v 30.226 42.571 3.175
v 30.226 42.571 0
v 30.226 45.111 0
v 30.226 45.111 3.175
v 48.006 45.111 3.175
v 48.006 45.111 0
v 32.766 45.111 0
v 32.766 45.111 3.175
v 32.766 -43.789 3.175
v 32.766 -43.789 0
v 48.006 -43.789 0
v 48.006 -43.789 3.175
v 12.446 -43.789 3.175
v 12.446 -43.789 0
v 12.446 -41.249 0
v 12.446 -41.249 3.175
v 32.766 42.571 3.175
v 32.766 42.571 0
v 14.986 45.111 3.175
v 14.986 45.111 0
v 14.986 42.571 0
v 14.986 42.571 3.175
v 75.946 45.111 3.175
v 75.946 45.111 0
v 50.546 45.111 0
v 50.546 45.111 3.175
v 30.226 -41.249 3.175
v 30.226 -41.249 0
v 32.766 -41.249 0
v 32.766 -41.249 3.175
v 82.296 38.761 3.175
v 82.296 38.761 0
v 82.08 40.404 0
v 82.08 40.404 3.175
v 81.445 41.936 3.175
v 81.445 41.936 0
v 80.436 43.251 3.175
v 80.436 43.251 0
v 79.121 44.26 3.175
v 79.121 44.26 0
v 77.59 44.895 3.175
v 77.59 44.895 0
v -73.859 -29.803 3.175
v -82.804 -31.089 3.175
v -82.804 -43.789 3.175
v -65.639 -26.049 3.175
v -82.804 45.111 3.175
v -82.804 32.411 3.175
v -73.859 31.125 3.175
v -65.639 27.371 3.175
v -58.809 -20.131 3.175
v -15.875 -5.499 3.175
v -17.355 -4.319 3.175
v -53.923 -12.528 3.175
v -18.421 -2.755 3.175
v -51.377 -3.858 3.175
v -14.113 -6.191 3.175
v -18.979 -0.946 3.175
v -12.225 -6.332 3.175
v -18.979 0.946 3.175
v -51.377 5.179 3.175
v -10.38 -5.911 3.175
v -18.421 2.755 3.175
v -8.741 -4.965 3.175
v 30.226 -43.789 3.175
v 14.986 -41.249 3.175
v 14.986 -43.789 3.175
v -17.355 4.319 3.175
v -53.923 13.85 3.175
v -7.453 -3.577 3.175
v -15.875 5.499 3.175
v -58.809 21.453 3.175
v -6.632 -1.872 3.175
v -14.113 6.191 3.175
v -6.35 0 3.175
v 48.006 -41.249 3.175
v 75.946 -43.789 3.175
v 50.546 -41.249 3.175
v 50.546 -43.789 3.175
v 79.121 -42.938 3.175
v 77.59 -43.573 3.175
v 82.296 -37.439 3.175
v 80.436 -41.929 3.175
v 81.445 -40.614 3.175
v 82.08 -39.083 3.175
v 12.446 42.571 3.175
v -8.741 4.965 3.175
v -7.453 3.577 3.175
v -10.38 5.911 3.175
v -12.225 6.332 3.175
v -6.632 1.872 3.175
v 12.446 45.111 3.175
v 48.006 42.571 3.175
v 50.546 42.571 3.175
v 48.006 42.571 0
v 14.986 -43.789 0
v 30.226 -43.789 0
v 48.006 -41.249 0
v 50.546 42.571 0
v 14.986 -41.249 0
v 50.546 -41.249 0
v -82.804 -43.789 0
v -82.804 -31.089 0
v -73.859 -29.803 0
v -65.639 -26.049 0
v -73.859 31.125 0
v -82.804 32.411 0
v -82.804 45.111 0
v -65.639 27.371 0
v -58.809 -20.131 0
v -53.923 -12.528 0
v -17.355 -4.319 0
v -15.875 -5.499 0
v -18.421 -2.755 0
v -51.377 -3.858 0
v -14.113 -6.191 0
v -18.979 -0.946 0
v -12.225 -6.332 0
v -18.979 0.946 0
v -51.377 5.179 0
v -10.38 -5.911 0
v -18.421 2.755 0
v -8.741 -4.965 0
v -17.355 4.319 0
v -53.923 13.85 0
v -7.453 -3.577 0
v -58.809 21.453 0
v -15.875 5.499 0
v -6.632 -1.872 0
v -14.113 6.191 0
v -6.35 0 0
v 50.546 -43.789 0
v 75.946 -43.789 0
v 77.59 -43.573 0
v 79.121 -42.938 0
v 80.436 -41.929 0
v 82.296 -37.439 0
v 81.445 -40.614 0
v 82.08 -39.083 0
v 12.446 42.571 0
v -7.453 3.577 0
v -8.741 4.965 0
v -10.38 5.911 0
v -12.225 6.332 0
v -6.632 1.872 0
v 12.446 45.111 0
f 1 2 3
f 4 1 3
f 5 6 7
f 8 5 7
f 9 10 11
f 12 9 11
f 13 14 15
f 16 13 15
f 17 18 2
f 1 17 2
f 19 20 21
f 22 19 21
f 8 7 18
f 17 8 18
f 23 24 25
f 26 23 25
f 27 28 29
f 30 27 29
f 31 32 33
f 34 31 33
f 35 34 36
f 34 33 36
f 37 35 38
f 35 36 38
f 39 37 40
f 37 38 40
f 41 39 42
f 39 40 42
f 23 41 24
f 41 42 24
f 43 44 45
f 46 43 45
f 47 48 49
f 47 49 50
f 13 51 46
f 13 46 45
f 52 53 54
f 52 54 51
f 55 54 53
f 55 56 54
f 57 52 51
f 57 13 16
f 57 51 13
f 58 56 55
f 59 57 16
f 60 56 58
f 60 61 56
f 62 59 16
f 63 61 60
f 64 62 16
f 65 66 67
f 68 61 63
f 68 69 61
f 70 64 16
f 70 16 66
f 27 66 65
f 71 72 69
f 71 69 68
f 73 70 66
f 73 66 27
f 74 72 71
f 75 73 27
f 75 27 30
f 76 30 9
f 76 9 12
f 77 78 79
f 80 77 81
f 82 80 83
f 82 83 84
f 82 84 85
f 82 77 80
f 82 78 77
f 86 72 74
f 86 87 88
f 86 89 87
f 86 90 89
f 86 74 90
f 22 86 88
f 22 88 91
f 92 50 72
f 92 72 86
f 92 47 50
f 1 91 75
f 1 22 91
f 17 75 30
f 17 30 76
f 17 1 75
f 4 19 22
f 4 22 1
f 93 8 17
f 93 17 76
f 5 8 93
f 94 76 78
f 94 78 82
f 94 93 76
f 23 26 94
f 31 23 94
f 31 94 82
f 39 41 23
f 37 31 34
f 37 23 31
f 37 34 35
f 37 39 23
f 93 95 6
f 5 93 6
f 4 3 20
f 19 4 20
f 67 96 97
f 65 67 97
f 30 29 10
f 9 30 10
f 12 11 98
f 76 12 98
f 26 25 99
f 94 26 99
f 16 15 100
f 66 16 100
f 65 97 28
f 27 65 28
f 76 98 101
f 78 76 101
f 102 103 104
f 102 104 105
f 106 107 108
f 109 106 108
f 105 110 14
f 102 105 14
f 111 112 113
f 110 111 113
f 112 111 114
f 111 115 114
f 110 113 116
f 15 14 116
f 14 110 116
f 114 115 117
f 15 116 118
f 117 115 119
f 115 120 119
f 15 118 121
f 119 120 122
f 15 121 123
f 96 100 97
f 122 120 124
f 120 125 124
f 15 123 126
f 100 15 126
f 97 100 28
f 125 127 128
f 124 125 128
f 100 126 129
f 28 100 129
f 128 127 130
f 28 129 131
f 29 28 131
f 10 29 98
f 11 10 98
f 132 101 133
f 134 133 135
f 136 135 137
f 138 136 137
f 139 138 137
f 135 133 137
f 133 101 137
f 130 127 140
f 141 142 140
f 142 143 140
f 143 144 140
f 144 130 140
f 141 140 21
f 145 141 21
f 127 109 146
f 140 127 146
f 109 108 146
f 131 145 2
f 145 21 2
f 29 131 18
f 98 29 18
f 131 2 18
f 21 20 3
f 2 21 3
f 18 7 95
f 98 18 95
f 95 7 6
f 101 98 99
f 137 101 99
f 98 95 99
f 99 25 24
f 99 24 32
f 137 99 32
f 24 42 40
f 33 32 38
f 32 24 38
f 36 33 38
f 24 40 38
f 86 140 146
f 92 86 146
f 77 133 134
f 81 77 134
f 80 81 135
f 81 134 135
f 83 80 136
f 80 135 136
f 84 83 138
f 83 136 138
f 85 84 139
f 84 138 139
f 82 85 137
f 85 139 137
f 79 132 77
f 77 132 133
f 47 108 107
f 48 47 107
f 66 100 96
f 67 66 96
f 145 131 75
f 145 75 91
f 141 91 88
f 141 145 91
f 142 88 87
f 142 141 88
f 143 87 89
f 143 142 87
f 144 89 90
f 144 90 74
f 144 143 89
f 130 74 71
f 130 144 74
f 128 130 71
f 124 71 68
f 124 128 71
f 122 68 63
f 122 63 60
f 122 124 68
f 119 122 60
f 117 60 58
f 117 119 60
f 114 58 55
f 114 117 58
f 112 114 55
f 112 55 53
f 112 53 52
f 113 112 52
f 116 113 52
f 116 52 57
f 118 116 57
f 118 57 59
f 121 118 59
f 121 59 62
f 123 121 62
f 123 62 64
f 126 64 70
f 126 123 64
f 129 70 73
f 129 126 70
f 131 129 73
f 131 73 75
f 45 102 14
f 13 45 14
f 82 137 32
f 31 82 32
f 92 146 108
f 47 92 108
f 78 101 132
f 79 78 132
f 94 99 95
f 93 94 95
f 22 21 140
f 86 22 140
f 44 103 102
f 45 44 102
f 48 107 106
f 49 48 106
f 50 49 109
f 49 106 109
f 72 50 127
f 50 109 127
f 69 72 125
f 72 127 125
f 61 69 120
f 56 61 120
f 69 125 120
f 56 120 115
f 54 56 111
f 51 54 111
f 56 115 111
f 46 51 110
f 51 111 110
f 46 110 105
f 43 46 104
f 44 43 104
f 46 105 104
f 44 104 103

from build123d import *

# Parameters (mm, degrees)
F0_R     = 6.35
F1_DEPTH = 3.175


# Not quite as in the source:
# - a feature names something its author has since deleted; it is built from what else it names


with BuildPart() as f1:
    # F0 (on Top) → F1 (new body)
    with BuildSketch(Plane.XY):
        with BuildLine():
            Line((50.546, -43.7890713215), (75.946, -43.7890713215))
            ThreePointArc((75.946, -43.7890713215), (80.4361280605, -41.929199382), (82.296, -37.4390713215))
            Line((82.296, -37.4390713215), (82.296, 38.7609286785))
            ThreePointArc((82.296, 38.7609286785), (80.4361280605, 43.251056739), (75.946, 45.1109286785))
            Line((75.946, 45.1109286785), (50.546, 45.1109286785))
            Line((50.546, 45.1109286785), (50.546, 42.5709286785))
            Line((50.546, 42.5709286785), (48.006, 42.5709286785))
            Line((48.006, 42.5709286785), (48.006, 45.1109286785))
            Line((48.006, 45.1109286785), (32.766, 45.1109286785))
            Line((32.766, 45.1109286785), (32.766, 42.5709286785))
            Line((32.766, 42.5709286785), (30.226, 42.5709286785))
            Line((30.226, 42.5709286785), (30.226, 45.1109286785))
            Line((30.226, 45.1109286785), (14.986, 45.1109286785))
            Line((14.986, 45.1109286785), (14.986, 42.5709286785))
            Line((14.986, 42.5709286785), (12.446, 42.5709286785))
            Line((12.446, 42.5709286785), (12.446, 45.1109286785))
            Line((12.446, 45.1109286785), (-38.354, 45.1109286785))
            Line((-38.354, 45.1109286785), (-38.354, -43.7890713215))
            Line((-38.354, -43.7890713215), (12.446, -43.7890713215))
            Line((12.446, -43.7890713215), (12.446, -41.2490713215))
            Line((12.446, -41.2490713215), (14.986, -41.2490713215))
            Line((14.986, -41.2490713215), (14.986, -43.7890713215))
            Line((14.986, -43.7890713215), (30.226, -43.7890713215))
            Line((30.226, -43.7890713215), (30.226, -41.2490713215))
            Line((30.226, -41.2490713215), (32.766, -41.2490713215))
            Line((32.766, -41.2490713215), (32.766, -43.7890713215))
            Line((32.766, -43.7890713215), (48.006, -43.7890713215))
            Line((48.006, -43.7890713215), (48.006, -41.2490713215))
            Line((48.006, -41.2490713215), (50.546, -41.2490713215))
            Line((50.546, -41.2490713215), (50.546, -43.7890713215))
        make_face()
        with Locations((-12.7, 0)):
            Circle(F0_R, mode=Mode.SUBTRACT)
        with BuildLine():
            Line((-82.804, -43.7890713215), (-38.354, -43.7890713215))
            Line((-38.354, -43.7890713215), (-38.354, 45.1109286785))
            Line((-38.354, 45.1109286785), (-82.804, 45.1109286785))
            Line((-82.804, 45.1109286785), (-82.804, 32.4109286785))
            ThreePointArc((-82.804, 32.4109286785), (-51.054, 0.6609286785), (-82.804, -31.0890713215))
            Line((-82.804, -31.0890713215), (-82.804, -43.7890713215))
        make_face()
    extrude(amount=F1_DEPTH)


solid = f1.part
